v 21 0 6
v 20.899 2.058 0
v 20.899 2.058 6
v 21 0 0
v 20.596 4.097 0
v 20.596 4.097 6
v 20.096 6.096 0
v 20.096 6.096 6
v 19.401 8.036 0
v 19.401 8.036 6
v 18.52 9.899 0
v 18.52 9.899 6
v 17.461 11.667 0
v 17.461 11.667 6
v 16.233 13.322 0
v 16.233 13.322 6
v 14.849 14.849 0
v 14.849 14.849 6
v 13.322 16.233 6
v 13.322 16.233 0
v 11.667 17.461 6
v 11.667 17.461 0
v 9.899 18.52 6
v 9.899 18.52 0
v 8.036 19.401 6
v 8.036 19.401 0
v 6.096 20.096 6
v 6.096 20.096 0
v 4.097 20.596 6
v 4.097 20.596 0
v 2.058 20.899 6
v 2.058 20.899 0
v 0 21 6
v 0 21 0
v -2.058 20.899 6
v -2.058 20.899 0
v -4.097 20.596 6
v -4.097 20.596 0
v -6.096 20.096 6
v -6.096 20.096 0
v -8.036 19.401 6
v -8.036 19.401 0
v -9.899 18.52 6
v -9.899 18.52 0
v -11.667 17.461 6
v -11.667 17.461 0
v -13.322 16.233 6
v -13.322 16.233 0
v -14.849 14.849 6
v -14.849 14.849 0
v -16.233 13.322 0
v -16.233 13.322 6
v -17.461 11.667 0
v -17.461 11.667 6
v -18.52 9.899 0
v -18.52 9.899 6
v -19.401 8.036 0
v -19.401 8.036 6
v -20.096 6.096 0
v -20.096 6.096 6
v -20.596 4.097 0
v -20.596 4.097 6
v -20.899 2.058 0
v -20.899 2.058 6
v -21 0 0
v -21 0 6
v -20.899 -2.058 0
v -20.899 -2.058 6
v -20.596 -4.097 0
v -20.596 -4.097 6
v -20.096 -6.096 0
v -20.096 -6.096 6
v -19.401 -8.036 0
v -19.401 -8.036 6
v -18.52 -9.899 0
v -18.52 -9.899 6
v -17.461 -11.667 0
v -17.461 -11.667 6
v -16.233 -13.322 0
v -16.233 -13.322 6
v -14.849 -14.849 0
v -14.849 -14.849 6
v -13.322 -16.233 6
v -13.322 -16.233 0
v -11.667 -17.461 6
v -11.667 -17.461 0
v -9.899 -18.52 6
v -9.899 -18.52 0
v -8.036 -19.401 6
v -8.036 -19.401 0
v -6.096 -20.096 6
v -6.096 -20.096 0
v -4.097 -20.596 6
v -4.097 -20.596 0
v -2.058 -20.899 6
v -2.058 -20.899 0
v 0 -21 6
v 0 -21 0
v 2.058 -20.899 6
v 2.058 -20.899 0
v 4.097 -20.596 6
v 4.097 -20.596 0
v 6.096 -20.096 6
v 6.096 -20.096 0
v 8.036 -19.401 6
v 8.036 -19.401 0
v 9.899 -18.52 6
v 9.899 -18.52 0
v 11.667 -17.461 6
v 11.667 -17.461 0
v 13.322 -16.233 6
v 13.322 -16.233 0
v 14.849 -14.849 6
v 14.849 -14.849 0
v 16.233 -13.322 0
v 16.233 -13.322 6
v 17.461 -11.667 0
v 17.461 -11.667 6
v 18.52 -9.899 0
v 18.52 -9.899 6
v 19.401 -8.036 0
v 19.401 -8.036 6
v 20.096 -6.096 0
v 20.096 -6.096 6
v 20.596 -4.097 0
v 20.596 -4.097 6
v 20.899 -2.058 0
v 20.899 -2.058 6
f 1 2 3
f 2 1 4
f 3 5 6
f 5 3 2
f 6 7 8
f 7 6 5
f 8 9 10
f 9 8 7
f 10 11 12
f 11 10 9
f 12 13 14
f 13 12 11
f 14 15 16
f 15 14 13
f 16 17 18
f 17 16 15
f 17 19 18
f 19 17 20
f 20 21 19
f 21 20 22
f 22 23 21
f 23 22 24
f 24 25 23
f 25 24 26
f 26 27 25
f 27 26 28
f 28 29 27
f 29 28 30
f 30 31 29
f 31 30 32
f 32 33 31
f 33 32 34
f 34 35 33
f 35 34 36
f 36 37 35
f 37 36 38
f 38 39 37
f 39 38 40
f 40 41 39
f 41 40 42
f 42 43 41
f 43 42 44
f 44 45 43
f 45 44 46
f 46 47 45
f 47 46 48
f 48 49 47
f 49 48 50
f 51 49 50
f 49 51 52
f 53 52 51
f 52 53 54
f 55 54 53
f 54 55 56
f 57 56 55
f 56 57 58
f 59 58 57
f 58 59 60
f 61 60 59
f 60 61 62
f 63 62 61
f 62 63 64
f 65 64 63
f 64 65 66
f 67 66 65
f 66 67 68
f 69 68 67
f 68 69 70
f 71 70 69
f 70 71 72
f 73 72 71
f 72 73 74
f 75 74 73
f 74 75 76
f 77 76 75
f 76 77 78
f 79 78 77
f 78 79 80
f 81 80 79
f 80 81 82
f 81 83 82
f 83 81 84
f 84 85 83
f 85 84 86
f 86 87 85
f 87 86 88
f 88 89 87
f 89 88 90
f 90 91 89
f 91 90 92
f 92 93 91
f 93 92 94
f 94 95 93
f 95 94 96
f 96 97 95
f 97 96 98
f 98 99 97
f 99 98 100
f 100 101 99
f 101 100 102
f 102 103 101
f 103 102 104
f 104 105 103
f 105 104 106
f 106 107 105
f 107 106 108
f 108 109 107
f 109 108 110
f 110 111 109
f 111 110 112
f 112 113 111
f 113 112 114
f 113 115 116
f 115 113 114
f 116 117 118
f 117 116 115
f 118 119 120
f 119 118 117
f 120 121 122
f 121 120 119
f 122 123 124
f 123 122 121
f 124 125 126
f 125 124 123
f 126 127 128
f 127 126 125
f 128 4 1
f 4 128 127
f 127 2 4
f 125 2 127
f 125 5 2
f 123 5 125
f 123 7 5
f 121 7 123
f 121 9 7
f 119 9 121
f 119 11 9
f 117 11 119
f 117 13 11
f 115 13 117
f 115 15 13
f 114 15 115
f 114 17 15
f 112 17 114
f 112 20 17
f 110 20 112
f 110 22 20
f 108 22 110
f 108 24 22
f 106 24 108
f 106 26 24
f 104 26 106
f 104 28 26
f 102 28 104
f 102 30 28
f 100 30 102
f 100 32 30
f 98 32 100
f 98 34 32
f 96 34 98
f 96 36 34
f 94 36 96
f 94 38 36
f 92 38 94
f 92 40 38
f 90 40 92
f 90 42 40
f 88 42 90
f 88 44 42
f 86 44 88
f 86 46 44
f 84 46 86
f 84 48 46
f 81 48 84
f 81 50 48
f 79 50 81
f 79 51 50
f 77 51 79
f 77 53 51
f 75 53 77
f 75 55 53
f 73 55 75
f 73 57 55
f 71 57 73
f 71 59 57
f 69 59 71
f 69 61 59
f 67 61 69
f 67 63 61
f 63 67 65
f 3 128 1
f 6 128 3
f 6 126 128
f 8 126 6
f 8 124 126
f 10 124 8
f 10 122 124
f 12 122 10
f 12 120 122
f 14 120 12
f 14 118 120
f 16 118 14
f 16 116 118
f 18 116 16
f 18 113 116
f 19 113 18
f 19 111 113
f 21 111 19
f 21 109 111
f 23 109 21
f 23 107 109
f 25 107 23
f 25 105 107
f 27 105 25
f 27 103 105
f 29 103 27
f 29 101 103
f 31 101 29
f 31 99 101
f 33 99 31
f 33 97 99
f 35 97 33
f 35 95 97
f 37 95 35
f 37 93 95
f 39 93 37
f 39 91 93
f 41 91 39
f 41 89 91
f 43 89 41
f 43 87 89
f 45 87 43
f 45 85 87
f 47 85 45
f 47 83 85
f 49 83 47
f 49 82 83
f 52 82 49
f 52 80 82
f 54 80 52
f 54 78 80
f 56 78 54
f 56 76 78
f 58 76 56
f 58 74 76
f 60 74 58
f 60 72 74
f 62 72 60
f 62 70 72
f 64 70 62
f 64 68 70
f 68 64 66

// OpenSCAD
// Starter file for task-004.
// Edit this file in OpenSCAD to complete the requested hard task.
$fn = 64;

cylinder(d=42, h=6);
